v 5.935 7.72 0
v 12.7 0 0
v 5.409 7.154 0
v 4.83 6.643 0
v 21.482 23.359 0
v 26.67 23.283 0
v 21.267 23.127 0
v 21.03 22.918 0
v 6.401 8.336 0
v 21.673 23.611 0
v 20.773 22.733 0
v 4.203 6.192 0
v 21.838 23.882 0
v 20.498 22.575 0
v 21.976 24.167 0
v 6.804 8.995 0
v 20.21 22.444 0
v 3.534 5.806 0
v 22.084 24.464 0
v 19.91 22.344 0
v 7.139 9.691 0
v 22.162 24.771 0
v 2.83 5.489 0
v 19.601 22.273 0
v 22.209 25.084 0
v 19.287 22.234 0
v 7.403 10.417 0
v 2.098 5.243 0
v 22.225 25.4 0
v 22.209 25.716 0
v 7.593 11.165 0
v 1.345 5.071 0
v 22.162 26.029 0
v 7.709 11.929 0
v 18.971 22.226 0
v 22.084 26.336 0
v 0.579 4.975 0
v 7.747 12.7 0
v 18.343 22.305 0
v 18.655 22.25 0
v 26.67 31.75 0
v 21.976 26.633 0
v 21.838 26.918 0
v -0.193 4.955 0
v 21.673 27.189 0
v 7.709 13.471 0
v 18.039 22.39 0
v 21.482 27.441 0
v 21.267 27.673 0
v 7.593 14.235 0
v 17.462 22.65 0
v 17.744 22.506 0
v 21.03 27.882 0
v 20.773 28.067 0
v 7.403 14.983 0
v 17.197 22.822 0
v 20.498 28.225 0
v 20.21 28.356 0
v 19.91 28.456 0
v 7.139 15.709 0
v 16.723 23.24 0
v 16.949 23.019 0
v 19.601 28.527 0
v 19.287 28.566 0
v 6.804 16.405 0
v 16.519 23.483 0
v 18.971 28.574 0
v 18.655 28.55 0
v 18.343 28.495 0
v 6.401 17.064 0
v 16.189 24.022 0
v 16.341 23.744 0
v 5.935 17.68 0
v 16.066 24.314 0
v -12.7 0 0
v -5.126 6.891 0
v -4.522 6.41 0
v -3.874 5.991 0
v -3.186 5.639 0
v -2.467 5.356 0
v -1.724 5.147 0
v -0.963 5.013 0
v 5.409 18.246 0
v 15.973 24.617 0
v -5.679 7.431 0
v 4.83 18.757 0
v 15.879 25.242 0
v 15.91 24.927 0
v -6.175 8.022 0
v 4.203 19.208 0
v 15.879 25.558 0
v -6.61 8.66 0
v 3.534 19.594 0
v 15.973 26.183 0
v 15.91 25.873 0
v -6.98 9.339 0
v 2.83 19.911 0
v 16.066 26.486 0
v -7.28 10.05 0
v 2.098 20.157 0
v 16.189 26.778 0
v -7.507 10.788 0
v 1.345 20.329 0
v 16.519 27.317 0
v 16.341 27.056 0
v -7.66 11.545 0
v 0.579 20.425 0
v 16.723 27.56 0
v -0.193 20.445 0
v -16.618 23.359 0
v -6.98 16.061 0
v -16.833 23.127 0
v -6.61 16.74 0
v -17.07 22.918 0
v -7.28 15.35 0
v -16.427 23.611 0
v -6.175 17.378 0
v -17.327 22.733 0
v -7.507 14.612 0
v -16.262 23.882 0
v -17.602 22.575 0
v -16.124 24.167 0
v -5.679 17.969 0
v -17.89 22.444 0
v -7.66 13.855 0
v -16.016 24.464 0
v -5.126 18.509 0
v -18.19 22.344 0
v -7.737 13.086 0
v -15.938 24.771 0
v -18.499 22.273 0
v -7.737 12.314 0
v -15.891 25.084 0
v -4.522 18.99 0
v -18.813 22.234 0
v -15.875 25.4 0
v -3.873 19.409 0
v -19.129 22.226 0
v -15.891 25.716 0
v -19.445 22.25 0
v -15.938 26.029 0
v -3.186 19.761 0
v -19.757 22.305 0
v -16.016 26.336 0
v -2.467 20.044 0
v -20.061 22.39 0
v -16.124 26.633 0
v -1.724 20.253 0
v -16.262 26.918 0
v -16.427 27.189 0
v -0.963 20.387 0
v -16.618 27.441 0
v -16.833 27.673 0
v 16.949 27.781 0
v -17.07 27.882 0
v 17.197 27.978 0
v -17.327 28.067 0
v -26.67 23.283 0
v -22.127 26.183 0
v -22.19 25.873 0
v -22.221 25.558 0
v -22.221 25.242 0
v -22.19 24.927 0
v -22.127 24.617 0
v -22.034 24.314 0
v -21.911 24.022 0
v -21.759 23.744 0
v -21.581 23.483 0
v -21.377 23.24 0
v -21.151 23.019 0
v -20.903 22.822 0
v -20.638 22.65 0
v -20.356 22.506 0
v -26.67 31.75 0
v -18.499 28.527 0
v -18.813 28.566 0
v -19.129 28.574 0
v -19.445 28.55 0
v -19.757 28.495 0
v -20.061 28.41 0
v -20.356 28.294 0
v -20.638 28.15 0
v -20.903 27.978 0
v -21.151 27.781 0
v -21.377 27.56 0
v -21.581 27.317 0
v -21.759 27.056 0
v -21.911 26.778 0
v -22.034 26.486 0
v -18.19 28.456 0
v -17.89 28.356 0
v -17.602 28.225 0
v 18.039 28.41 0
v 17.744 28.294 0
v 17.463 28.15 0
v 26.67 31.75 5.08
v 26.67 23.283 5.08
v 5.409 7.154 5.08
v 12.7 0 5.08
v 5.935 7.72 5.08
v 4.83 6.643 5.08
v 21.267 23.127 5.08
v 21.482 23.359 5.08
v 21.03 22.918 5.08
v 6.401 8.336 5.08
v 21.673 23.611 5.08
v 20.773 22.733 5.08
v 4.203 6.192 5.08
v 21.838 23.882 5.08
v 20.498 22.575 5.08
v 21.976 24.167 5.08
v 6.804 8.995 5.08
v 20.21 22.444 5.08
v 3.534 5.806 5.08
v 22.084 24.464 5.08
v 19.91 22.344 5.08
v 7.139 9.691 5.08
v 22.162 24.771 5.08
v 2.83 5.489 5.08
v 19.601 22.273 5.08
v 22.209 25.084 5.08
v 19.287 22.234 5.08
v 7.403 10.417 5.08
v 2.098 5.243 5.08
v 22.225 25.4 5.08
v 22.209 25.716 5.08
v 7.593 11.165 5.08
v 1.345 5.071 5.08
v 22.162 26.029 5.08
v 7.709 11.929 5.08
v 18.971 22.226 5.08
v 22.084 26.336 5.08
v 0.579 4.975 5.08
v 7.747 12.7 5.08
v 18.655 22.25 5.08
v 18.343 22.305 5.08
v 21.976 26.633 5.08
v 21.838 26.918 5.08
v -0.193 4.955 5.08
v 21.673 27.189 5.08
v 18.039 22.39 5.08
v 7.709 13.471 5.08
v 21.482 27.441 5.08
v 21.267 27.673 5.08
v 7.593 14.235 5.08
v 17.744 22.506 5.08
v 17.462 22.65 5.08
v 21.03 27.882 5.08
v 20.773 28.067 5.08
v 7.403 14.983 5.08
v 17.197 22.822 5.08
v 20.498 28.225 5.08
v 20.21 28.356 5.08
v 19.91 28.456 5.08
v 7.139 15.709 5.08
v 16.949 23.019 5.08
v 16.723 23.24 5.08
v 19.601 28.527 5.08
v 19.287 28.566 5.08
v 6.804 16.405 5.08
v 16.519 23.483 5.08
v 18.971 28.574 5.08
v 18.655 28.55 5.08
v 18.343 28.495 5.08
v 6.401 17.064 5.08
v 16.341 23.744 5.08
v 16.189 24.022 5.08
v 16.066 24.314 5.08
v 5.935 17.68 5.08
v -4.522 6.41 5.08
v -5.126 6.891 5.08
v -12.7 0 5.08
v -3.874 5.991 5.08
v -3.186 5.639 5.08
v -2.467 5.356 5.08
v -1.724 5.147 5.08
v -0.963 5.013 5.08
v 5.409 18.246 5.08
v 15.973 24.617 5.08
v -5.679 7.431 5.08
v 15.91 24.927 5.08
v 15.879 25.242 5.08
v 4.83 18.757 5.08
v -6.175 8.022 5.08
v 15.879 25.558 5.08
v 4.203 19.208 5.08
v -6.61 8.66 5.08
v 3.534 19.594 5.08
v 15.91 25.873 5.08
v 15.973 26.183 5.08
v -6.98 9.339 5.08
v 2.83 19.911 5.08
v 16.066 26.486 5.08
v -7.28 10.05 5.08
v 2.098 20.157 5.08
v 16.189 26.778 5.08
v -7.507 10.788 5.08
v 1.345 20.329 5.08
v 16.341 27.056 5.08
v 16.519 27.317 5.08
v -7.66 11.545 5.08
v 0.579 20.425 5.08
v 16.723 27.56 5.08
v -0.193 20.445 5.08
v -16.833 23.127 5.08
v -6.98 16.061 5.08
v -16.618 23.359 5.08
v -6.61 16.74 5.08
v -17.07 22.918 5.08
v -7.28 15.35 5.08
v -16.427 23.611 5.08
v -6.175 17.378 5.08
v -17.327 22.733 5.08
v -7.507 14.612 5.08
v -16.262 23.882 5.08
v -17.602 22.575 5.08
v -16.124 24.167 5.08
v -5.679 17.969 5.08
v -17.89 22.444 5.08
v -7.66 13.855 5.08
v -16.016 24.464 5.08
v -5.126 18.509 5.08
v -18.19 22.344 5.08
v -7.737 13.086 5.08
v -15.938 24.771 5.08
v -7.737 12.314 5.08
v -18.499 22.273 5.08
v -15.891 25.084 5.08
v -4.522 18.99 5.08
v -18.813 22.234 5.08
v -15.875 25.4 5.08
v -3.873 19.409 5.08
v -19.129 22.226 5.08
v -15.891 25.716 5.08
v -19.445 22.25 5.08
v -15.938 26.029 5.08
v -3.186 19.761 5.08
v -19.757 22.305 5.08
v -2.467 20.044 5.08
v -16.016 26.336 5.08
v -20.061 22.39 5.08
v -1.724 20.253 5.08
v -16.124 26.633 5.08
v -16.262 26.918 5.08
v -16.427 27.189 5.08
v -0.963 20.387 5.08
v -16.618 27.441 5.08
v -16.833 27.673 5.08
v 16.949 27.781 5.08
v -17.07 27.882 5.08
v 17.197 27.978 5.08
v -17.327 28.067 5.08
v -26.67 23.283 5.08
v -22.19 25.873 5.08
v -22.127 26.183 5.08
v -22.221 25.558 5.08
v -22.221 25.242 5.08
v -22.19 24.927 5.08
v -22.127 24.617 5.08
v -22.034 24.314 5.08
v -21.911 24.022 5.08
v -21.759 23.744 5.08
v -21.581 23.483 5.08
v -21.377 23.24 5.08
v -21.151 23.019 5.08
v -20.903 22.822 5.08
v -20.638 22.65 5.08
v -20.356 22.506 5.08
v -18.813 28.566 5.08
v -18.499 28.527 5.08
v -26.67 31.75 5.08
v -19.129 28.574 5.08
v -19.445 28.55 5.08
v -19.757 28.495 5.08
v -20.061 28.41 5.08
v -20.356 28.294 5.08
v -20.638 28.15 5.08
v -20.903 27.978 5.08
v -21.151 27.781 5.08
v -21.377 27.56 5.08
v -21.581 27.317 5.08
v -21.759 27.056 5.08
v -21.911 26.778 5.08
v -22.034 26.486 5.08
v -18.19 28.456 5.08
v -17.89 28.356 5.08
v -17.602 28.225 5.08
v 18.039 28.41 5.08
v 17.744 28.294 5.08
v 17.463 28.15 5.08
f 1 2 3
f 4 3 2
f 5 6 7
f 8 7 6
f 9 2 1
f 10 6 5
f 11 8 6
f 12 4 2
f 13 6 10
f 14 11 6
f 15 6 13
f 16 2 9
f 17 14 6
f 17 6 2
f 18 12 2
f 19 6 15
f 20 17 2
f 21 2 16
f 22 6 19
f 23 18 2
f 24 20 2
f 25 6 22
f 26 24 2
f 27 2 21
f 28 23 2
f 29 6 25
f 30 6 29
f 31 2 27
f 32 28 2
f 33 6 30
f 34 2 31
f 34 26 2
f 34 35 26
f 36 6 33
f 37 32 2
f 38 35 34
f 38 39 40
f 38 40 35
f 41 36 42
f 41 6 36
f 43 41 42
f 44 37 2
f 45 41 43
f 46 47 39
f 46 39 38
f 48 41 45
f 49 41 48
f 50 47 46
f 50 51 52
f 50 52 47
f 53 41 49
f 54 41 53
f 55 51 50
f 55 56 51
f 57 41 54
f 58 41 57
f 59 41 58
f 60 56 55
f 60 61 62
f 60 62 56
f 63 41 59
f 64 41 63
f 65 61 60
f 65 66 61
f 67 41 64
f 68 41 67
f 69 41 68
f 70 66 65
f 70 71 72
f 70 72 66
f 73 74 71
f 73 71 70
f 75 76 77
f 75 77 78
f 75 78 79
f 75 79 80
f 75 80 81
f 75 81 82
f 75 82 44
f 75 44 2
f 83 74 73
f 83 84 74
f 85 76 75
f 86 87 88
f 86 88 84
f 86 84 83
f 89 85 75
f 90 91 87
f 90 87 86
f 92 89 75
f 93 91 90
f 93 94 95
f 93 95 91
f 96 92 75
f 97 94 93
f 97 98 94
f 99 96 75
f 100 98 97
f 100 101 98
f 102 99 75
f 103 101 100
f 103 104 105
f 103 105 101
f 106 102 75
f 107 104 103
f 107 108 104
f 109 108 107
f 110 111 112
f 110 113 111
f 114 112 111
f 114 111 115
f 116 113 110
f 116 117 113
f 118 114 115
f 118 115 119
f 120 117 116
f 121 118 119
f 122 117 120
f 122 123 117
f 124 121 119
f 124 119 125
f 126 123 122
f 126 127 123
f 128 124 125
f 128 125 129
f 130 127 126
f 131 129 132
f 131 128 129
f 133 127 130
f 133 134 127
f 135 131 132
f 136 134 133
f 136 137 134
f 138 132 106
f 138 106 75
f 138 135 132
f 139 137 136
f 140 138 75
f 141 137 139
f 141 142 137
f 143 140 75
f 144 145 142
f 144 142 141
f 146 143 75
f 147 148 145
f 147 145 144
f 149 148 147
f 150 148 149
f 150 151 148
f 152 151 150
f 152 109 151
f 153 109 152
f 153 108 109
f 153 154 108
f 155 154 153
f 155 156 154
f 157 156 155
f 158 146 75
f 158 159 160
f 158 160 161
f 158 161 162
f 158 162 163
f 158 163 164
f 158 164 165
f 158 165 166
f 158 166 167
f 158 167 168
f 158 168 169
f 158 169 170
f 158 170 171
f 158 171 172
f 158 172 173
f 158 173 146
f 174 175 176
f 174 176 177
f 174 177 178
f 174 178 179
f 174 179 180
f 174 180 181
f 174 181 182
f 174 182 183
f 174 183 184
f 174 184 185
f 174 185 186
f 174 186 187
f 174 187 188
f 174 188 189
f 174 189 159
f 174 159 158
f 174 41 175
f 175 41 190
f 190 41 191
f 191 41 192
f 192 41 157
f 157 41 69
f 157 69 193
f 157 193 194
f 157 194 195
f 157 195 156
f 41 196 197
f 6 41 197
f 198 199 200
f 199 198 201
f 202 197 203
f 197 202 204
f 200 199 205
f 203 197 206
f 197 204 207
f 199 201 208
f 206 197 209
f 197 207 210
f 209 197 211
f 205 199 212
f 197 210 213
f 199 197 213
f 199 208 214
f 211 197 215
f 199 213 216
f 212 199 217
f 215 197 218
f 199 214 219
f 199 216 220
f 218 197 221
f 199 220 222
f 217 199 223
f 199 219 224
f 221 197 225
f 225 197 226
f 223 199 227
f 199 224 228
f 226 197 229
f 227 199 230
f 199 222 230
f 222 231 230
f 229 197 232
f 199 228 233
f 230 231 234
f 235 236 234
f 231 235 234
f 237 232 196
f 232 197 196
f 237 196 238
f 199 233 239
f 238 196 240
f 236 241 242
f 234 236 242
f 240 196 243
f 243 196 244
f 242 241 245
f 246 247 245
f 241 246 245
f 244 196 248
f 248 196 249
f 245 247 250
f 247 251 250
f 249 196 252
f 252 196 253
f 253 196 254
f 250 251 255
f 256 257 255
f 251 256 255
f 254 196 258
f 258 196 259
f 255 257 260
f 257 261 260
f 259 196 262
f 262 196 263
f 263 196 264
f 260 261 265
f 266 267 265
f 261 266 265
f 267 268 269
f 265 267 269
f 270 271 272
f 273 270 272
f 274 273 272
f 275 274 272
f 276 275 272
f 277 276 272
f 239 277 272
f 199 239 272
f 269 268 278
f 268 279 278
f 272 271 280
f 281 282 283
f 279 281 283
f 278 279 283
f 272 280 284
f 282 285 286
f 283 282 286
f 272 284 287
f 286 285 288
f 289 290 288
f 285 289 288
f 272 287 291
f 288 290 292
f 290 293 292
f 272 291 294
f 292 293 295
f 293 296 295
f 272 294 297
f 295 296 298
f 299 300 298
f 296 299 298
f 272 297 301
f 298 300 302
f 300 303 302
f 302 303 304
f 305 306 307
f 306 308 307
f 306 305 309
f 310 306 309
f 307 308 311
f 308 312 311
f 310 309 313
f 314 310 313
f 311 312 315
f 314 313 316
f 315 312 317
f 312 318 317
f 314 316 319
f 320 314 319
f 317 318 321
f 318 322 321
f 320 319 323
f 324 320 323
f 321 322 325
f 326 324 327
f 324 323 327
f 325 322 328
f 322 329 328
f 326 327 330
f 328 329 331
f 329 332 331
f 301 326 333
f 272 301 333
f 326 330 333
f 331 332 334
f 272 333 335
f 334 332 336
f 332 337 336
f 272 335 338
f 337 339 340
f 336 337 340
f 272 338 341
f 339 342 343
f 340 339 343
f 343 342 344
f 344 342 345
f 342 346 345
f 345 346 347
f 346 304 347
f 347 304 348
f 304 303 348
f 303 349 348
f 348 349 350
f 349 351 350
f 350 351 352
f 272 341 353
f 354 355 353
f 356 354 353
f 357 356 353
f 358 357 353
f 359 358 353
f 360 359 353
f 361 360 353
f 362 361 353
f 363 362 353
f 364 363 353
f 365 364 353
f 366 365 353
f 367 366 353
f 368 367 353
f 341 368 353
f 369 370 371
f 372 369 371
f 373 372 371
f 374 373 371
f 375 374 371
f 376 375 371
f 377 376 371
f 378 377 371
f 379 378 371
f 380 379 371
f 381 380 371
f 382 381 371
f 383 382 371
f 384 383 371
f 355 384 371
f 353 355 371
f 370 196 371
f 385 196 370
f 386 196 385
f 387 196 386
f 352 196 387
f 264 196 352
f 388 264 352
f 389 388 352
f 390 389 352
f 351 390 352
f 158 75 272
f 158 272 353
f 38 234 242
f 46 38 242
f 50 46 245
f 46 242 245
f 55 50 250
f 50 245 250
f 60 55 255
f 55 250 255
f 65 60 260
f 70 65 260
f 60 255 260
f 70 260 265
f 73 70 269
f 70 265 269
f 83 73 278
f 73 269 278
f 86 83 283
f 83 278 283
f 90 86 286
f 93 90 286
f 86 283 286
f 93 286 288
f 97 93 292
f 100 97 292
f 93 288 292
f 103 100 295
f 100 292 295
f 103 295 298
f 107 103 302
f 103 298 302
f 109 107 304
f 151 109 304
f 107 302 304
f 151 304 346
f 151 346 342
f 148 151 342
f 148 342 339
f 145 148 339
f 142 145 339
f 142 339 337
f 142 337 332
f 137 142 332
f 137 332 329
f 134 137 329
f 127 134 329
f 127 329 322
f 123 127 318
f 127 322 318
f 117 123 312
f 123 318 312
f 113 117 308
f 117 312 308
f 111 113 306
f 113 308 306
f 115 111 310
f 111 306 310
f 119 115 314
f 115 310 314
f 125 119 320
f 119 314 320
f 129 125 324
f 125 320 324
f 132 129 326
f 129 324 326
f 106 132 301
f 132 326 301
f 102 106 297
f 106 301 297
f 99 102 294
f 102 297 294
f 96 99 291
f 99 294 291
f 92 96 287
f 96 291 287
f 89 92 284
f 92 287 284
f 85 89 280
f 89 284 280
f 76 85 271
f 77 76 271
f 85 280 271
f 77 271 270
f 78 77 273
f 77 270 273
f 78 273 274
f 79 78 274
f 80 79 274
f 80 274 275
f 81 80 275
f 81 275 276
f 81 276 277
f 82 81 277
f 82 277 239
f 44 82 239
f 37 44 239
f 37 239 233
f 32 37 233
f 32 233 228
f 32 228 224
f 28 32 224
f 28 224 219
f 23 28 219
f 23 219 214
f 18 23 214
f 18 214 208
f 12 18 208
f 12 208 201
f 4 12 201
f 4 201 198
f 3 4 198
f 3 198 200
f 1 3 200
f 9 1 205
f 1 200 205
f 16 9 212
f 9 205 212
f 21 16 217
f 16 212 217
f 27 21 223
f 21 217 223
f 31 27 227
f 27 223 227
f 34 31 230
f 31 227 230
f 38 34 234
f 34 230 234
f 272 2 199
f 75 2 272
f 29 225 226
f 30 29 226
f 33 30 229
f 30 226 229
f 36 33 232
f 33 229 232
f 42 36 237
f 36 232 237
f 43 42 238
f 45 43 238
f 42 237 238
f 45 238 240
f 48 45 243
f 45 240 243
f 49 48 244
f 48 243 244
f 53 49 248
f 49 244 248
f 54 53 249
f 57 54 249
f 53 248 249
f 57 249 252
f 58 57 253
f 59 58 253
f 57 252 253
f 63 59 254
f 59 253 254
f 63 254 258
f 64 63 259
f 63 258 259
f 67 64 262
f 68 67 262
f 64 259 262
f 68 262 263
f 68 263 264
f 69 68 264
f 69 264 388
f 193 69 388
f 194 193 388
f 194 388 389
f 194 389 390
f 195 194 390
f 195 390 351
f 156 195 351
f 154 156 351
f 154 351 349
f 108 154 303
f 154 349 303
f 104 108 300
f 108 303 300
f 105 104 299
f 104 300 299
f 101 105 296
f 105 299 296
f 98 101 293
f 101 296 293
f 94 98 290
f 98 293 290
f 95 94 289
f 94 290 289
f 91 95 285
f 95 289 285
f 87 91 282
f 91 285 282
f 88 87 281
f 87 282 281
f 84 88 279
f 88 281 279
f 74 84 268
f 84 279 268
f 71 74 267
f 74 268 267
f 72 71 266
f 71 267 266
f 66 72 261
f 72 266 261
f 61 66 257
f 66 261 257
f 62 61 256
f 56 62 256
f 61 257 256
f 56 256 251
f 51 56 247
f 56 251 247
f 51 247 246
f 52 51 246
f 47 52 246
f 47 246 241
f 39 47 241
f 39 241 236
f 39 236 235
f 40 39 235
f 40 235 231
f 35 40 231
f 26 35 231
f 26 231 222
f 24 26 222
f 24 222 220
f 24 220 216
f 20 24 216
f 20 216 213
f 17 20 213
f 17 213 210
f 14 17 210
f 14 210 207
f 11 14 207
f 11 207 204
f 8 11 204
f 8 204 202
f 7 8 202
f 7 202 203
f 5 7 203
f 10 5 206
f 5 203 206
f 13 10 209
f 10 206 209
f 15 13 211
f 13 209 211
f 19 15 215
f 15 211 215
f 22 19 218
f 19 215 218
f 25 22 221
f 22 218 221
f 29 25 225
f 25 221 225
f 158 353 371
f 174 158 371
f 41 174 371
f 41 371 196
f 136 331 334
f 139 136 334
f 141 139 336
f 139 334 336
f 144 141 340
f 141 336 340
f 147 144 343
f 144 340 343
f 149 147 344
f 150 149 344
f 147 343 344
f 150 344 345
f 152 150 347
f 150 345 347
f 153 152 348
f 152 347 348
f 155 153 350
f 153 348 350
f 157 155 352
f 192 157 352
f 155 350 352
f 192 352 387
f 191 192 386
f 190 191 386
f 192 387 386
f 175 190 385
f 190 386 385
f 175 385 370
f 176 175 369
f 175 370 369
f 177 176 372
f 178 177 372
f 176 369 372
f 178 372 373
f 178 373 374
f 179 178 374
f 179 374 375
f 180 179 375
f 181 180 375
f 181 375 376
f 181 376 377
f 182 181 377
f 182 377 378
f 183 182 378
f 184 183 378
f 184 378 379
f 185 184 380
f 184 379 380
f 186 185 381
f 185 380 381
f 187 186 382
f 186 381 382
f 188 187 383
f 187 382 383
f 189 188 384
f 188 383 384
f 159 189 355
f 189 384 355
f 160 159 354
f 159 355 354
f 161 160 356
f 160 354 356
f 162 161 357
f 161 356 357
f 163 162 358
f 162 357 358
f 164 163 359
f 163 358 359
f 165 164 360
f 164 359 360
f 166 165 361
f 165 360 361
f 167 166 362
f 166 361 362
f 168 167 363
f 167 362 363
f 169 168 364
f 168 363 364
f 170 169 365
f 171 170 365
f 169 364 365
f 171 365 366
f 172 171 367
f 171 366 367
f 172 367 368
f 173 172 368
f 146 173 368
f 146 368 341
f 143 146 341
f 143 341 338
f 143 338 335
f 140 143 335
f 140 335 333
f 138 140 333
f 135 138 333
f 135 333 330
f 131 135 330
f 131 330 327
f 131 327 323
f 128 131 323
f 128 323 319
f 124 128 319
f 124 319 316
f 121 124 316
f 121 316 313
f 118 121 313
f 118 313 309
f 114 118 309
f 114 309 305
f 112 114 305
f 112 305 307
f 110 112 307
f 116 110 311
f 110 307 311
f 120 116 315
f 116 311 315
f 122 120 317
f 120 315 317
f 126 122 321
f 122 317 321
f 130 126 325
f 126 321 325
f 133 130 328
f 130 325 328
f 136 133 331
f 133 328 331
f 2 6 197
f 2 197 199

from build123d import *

# Parameters (mm, degrees)
BOSS_EXTRUDE1_DEPTH = 5.08
SKETCH3_R           = 7.747
SKETCH3_R_2         = 3.175
CUT_EXTRUDE2_DEPTH  = 5.08


with BuildPart() as part:
    # Sketch1 → Boss-Extrude1 (new body)
    with BuildSketch(Plane.XY):
        Polygon((-31.75, 31.75), (31.75, 31.75), (12.7, 0), (-12.7, 0), align=None)
    extrude(amount=BOSS_EXTRUDE1_DEPTH)

    # Sketch3 → Cut-Extrude2 (cut)
    with BuildSketch(Plane.XY.offset(5.08)):
        with Locations((0, 12.7)):
            Circle(SKETCH3_R)
        with Locations((-19.05, 25.4)):
            Circle(SKETCH3_R_2)
        with Locations((19.05, 25.4)):
            Circle(SKETCH3_R_2)
        Polygon((-26.67, 23.283333333), (-26.67, 31.75), (-31.75, 31.75), align=None)
        Polygon((26.67, 31.75), (26.67, 23.283333333), (31.75, 31.75), align=None)
    extrude(amount=-CUT_EXTRUDE2_DEPTH, mode=Mode.SUBTRACT)


solid = part.part
